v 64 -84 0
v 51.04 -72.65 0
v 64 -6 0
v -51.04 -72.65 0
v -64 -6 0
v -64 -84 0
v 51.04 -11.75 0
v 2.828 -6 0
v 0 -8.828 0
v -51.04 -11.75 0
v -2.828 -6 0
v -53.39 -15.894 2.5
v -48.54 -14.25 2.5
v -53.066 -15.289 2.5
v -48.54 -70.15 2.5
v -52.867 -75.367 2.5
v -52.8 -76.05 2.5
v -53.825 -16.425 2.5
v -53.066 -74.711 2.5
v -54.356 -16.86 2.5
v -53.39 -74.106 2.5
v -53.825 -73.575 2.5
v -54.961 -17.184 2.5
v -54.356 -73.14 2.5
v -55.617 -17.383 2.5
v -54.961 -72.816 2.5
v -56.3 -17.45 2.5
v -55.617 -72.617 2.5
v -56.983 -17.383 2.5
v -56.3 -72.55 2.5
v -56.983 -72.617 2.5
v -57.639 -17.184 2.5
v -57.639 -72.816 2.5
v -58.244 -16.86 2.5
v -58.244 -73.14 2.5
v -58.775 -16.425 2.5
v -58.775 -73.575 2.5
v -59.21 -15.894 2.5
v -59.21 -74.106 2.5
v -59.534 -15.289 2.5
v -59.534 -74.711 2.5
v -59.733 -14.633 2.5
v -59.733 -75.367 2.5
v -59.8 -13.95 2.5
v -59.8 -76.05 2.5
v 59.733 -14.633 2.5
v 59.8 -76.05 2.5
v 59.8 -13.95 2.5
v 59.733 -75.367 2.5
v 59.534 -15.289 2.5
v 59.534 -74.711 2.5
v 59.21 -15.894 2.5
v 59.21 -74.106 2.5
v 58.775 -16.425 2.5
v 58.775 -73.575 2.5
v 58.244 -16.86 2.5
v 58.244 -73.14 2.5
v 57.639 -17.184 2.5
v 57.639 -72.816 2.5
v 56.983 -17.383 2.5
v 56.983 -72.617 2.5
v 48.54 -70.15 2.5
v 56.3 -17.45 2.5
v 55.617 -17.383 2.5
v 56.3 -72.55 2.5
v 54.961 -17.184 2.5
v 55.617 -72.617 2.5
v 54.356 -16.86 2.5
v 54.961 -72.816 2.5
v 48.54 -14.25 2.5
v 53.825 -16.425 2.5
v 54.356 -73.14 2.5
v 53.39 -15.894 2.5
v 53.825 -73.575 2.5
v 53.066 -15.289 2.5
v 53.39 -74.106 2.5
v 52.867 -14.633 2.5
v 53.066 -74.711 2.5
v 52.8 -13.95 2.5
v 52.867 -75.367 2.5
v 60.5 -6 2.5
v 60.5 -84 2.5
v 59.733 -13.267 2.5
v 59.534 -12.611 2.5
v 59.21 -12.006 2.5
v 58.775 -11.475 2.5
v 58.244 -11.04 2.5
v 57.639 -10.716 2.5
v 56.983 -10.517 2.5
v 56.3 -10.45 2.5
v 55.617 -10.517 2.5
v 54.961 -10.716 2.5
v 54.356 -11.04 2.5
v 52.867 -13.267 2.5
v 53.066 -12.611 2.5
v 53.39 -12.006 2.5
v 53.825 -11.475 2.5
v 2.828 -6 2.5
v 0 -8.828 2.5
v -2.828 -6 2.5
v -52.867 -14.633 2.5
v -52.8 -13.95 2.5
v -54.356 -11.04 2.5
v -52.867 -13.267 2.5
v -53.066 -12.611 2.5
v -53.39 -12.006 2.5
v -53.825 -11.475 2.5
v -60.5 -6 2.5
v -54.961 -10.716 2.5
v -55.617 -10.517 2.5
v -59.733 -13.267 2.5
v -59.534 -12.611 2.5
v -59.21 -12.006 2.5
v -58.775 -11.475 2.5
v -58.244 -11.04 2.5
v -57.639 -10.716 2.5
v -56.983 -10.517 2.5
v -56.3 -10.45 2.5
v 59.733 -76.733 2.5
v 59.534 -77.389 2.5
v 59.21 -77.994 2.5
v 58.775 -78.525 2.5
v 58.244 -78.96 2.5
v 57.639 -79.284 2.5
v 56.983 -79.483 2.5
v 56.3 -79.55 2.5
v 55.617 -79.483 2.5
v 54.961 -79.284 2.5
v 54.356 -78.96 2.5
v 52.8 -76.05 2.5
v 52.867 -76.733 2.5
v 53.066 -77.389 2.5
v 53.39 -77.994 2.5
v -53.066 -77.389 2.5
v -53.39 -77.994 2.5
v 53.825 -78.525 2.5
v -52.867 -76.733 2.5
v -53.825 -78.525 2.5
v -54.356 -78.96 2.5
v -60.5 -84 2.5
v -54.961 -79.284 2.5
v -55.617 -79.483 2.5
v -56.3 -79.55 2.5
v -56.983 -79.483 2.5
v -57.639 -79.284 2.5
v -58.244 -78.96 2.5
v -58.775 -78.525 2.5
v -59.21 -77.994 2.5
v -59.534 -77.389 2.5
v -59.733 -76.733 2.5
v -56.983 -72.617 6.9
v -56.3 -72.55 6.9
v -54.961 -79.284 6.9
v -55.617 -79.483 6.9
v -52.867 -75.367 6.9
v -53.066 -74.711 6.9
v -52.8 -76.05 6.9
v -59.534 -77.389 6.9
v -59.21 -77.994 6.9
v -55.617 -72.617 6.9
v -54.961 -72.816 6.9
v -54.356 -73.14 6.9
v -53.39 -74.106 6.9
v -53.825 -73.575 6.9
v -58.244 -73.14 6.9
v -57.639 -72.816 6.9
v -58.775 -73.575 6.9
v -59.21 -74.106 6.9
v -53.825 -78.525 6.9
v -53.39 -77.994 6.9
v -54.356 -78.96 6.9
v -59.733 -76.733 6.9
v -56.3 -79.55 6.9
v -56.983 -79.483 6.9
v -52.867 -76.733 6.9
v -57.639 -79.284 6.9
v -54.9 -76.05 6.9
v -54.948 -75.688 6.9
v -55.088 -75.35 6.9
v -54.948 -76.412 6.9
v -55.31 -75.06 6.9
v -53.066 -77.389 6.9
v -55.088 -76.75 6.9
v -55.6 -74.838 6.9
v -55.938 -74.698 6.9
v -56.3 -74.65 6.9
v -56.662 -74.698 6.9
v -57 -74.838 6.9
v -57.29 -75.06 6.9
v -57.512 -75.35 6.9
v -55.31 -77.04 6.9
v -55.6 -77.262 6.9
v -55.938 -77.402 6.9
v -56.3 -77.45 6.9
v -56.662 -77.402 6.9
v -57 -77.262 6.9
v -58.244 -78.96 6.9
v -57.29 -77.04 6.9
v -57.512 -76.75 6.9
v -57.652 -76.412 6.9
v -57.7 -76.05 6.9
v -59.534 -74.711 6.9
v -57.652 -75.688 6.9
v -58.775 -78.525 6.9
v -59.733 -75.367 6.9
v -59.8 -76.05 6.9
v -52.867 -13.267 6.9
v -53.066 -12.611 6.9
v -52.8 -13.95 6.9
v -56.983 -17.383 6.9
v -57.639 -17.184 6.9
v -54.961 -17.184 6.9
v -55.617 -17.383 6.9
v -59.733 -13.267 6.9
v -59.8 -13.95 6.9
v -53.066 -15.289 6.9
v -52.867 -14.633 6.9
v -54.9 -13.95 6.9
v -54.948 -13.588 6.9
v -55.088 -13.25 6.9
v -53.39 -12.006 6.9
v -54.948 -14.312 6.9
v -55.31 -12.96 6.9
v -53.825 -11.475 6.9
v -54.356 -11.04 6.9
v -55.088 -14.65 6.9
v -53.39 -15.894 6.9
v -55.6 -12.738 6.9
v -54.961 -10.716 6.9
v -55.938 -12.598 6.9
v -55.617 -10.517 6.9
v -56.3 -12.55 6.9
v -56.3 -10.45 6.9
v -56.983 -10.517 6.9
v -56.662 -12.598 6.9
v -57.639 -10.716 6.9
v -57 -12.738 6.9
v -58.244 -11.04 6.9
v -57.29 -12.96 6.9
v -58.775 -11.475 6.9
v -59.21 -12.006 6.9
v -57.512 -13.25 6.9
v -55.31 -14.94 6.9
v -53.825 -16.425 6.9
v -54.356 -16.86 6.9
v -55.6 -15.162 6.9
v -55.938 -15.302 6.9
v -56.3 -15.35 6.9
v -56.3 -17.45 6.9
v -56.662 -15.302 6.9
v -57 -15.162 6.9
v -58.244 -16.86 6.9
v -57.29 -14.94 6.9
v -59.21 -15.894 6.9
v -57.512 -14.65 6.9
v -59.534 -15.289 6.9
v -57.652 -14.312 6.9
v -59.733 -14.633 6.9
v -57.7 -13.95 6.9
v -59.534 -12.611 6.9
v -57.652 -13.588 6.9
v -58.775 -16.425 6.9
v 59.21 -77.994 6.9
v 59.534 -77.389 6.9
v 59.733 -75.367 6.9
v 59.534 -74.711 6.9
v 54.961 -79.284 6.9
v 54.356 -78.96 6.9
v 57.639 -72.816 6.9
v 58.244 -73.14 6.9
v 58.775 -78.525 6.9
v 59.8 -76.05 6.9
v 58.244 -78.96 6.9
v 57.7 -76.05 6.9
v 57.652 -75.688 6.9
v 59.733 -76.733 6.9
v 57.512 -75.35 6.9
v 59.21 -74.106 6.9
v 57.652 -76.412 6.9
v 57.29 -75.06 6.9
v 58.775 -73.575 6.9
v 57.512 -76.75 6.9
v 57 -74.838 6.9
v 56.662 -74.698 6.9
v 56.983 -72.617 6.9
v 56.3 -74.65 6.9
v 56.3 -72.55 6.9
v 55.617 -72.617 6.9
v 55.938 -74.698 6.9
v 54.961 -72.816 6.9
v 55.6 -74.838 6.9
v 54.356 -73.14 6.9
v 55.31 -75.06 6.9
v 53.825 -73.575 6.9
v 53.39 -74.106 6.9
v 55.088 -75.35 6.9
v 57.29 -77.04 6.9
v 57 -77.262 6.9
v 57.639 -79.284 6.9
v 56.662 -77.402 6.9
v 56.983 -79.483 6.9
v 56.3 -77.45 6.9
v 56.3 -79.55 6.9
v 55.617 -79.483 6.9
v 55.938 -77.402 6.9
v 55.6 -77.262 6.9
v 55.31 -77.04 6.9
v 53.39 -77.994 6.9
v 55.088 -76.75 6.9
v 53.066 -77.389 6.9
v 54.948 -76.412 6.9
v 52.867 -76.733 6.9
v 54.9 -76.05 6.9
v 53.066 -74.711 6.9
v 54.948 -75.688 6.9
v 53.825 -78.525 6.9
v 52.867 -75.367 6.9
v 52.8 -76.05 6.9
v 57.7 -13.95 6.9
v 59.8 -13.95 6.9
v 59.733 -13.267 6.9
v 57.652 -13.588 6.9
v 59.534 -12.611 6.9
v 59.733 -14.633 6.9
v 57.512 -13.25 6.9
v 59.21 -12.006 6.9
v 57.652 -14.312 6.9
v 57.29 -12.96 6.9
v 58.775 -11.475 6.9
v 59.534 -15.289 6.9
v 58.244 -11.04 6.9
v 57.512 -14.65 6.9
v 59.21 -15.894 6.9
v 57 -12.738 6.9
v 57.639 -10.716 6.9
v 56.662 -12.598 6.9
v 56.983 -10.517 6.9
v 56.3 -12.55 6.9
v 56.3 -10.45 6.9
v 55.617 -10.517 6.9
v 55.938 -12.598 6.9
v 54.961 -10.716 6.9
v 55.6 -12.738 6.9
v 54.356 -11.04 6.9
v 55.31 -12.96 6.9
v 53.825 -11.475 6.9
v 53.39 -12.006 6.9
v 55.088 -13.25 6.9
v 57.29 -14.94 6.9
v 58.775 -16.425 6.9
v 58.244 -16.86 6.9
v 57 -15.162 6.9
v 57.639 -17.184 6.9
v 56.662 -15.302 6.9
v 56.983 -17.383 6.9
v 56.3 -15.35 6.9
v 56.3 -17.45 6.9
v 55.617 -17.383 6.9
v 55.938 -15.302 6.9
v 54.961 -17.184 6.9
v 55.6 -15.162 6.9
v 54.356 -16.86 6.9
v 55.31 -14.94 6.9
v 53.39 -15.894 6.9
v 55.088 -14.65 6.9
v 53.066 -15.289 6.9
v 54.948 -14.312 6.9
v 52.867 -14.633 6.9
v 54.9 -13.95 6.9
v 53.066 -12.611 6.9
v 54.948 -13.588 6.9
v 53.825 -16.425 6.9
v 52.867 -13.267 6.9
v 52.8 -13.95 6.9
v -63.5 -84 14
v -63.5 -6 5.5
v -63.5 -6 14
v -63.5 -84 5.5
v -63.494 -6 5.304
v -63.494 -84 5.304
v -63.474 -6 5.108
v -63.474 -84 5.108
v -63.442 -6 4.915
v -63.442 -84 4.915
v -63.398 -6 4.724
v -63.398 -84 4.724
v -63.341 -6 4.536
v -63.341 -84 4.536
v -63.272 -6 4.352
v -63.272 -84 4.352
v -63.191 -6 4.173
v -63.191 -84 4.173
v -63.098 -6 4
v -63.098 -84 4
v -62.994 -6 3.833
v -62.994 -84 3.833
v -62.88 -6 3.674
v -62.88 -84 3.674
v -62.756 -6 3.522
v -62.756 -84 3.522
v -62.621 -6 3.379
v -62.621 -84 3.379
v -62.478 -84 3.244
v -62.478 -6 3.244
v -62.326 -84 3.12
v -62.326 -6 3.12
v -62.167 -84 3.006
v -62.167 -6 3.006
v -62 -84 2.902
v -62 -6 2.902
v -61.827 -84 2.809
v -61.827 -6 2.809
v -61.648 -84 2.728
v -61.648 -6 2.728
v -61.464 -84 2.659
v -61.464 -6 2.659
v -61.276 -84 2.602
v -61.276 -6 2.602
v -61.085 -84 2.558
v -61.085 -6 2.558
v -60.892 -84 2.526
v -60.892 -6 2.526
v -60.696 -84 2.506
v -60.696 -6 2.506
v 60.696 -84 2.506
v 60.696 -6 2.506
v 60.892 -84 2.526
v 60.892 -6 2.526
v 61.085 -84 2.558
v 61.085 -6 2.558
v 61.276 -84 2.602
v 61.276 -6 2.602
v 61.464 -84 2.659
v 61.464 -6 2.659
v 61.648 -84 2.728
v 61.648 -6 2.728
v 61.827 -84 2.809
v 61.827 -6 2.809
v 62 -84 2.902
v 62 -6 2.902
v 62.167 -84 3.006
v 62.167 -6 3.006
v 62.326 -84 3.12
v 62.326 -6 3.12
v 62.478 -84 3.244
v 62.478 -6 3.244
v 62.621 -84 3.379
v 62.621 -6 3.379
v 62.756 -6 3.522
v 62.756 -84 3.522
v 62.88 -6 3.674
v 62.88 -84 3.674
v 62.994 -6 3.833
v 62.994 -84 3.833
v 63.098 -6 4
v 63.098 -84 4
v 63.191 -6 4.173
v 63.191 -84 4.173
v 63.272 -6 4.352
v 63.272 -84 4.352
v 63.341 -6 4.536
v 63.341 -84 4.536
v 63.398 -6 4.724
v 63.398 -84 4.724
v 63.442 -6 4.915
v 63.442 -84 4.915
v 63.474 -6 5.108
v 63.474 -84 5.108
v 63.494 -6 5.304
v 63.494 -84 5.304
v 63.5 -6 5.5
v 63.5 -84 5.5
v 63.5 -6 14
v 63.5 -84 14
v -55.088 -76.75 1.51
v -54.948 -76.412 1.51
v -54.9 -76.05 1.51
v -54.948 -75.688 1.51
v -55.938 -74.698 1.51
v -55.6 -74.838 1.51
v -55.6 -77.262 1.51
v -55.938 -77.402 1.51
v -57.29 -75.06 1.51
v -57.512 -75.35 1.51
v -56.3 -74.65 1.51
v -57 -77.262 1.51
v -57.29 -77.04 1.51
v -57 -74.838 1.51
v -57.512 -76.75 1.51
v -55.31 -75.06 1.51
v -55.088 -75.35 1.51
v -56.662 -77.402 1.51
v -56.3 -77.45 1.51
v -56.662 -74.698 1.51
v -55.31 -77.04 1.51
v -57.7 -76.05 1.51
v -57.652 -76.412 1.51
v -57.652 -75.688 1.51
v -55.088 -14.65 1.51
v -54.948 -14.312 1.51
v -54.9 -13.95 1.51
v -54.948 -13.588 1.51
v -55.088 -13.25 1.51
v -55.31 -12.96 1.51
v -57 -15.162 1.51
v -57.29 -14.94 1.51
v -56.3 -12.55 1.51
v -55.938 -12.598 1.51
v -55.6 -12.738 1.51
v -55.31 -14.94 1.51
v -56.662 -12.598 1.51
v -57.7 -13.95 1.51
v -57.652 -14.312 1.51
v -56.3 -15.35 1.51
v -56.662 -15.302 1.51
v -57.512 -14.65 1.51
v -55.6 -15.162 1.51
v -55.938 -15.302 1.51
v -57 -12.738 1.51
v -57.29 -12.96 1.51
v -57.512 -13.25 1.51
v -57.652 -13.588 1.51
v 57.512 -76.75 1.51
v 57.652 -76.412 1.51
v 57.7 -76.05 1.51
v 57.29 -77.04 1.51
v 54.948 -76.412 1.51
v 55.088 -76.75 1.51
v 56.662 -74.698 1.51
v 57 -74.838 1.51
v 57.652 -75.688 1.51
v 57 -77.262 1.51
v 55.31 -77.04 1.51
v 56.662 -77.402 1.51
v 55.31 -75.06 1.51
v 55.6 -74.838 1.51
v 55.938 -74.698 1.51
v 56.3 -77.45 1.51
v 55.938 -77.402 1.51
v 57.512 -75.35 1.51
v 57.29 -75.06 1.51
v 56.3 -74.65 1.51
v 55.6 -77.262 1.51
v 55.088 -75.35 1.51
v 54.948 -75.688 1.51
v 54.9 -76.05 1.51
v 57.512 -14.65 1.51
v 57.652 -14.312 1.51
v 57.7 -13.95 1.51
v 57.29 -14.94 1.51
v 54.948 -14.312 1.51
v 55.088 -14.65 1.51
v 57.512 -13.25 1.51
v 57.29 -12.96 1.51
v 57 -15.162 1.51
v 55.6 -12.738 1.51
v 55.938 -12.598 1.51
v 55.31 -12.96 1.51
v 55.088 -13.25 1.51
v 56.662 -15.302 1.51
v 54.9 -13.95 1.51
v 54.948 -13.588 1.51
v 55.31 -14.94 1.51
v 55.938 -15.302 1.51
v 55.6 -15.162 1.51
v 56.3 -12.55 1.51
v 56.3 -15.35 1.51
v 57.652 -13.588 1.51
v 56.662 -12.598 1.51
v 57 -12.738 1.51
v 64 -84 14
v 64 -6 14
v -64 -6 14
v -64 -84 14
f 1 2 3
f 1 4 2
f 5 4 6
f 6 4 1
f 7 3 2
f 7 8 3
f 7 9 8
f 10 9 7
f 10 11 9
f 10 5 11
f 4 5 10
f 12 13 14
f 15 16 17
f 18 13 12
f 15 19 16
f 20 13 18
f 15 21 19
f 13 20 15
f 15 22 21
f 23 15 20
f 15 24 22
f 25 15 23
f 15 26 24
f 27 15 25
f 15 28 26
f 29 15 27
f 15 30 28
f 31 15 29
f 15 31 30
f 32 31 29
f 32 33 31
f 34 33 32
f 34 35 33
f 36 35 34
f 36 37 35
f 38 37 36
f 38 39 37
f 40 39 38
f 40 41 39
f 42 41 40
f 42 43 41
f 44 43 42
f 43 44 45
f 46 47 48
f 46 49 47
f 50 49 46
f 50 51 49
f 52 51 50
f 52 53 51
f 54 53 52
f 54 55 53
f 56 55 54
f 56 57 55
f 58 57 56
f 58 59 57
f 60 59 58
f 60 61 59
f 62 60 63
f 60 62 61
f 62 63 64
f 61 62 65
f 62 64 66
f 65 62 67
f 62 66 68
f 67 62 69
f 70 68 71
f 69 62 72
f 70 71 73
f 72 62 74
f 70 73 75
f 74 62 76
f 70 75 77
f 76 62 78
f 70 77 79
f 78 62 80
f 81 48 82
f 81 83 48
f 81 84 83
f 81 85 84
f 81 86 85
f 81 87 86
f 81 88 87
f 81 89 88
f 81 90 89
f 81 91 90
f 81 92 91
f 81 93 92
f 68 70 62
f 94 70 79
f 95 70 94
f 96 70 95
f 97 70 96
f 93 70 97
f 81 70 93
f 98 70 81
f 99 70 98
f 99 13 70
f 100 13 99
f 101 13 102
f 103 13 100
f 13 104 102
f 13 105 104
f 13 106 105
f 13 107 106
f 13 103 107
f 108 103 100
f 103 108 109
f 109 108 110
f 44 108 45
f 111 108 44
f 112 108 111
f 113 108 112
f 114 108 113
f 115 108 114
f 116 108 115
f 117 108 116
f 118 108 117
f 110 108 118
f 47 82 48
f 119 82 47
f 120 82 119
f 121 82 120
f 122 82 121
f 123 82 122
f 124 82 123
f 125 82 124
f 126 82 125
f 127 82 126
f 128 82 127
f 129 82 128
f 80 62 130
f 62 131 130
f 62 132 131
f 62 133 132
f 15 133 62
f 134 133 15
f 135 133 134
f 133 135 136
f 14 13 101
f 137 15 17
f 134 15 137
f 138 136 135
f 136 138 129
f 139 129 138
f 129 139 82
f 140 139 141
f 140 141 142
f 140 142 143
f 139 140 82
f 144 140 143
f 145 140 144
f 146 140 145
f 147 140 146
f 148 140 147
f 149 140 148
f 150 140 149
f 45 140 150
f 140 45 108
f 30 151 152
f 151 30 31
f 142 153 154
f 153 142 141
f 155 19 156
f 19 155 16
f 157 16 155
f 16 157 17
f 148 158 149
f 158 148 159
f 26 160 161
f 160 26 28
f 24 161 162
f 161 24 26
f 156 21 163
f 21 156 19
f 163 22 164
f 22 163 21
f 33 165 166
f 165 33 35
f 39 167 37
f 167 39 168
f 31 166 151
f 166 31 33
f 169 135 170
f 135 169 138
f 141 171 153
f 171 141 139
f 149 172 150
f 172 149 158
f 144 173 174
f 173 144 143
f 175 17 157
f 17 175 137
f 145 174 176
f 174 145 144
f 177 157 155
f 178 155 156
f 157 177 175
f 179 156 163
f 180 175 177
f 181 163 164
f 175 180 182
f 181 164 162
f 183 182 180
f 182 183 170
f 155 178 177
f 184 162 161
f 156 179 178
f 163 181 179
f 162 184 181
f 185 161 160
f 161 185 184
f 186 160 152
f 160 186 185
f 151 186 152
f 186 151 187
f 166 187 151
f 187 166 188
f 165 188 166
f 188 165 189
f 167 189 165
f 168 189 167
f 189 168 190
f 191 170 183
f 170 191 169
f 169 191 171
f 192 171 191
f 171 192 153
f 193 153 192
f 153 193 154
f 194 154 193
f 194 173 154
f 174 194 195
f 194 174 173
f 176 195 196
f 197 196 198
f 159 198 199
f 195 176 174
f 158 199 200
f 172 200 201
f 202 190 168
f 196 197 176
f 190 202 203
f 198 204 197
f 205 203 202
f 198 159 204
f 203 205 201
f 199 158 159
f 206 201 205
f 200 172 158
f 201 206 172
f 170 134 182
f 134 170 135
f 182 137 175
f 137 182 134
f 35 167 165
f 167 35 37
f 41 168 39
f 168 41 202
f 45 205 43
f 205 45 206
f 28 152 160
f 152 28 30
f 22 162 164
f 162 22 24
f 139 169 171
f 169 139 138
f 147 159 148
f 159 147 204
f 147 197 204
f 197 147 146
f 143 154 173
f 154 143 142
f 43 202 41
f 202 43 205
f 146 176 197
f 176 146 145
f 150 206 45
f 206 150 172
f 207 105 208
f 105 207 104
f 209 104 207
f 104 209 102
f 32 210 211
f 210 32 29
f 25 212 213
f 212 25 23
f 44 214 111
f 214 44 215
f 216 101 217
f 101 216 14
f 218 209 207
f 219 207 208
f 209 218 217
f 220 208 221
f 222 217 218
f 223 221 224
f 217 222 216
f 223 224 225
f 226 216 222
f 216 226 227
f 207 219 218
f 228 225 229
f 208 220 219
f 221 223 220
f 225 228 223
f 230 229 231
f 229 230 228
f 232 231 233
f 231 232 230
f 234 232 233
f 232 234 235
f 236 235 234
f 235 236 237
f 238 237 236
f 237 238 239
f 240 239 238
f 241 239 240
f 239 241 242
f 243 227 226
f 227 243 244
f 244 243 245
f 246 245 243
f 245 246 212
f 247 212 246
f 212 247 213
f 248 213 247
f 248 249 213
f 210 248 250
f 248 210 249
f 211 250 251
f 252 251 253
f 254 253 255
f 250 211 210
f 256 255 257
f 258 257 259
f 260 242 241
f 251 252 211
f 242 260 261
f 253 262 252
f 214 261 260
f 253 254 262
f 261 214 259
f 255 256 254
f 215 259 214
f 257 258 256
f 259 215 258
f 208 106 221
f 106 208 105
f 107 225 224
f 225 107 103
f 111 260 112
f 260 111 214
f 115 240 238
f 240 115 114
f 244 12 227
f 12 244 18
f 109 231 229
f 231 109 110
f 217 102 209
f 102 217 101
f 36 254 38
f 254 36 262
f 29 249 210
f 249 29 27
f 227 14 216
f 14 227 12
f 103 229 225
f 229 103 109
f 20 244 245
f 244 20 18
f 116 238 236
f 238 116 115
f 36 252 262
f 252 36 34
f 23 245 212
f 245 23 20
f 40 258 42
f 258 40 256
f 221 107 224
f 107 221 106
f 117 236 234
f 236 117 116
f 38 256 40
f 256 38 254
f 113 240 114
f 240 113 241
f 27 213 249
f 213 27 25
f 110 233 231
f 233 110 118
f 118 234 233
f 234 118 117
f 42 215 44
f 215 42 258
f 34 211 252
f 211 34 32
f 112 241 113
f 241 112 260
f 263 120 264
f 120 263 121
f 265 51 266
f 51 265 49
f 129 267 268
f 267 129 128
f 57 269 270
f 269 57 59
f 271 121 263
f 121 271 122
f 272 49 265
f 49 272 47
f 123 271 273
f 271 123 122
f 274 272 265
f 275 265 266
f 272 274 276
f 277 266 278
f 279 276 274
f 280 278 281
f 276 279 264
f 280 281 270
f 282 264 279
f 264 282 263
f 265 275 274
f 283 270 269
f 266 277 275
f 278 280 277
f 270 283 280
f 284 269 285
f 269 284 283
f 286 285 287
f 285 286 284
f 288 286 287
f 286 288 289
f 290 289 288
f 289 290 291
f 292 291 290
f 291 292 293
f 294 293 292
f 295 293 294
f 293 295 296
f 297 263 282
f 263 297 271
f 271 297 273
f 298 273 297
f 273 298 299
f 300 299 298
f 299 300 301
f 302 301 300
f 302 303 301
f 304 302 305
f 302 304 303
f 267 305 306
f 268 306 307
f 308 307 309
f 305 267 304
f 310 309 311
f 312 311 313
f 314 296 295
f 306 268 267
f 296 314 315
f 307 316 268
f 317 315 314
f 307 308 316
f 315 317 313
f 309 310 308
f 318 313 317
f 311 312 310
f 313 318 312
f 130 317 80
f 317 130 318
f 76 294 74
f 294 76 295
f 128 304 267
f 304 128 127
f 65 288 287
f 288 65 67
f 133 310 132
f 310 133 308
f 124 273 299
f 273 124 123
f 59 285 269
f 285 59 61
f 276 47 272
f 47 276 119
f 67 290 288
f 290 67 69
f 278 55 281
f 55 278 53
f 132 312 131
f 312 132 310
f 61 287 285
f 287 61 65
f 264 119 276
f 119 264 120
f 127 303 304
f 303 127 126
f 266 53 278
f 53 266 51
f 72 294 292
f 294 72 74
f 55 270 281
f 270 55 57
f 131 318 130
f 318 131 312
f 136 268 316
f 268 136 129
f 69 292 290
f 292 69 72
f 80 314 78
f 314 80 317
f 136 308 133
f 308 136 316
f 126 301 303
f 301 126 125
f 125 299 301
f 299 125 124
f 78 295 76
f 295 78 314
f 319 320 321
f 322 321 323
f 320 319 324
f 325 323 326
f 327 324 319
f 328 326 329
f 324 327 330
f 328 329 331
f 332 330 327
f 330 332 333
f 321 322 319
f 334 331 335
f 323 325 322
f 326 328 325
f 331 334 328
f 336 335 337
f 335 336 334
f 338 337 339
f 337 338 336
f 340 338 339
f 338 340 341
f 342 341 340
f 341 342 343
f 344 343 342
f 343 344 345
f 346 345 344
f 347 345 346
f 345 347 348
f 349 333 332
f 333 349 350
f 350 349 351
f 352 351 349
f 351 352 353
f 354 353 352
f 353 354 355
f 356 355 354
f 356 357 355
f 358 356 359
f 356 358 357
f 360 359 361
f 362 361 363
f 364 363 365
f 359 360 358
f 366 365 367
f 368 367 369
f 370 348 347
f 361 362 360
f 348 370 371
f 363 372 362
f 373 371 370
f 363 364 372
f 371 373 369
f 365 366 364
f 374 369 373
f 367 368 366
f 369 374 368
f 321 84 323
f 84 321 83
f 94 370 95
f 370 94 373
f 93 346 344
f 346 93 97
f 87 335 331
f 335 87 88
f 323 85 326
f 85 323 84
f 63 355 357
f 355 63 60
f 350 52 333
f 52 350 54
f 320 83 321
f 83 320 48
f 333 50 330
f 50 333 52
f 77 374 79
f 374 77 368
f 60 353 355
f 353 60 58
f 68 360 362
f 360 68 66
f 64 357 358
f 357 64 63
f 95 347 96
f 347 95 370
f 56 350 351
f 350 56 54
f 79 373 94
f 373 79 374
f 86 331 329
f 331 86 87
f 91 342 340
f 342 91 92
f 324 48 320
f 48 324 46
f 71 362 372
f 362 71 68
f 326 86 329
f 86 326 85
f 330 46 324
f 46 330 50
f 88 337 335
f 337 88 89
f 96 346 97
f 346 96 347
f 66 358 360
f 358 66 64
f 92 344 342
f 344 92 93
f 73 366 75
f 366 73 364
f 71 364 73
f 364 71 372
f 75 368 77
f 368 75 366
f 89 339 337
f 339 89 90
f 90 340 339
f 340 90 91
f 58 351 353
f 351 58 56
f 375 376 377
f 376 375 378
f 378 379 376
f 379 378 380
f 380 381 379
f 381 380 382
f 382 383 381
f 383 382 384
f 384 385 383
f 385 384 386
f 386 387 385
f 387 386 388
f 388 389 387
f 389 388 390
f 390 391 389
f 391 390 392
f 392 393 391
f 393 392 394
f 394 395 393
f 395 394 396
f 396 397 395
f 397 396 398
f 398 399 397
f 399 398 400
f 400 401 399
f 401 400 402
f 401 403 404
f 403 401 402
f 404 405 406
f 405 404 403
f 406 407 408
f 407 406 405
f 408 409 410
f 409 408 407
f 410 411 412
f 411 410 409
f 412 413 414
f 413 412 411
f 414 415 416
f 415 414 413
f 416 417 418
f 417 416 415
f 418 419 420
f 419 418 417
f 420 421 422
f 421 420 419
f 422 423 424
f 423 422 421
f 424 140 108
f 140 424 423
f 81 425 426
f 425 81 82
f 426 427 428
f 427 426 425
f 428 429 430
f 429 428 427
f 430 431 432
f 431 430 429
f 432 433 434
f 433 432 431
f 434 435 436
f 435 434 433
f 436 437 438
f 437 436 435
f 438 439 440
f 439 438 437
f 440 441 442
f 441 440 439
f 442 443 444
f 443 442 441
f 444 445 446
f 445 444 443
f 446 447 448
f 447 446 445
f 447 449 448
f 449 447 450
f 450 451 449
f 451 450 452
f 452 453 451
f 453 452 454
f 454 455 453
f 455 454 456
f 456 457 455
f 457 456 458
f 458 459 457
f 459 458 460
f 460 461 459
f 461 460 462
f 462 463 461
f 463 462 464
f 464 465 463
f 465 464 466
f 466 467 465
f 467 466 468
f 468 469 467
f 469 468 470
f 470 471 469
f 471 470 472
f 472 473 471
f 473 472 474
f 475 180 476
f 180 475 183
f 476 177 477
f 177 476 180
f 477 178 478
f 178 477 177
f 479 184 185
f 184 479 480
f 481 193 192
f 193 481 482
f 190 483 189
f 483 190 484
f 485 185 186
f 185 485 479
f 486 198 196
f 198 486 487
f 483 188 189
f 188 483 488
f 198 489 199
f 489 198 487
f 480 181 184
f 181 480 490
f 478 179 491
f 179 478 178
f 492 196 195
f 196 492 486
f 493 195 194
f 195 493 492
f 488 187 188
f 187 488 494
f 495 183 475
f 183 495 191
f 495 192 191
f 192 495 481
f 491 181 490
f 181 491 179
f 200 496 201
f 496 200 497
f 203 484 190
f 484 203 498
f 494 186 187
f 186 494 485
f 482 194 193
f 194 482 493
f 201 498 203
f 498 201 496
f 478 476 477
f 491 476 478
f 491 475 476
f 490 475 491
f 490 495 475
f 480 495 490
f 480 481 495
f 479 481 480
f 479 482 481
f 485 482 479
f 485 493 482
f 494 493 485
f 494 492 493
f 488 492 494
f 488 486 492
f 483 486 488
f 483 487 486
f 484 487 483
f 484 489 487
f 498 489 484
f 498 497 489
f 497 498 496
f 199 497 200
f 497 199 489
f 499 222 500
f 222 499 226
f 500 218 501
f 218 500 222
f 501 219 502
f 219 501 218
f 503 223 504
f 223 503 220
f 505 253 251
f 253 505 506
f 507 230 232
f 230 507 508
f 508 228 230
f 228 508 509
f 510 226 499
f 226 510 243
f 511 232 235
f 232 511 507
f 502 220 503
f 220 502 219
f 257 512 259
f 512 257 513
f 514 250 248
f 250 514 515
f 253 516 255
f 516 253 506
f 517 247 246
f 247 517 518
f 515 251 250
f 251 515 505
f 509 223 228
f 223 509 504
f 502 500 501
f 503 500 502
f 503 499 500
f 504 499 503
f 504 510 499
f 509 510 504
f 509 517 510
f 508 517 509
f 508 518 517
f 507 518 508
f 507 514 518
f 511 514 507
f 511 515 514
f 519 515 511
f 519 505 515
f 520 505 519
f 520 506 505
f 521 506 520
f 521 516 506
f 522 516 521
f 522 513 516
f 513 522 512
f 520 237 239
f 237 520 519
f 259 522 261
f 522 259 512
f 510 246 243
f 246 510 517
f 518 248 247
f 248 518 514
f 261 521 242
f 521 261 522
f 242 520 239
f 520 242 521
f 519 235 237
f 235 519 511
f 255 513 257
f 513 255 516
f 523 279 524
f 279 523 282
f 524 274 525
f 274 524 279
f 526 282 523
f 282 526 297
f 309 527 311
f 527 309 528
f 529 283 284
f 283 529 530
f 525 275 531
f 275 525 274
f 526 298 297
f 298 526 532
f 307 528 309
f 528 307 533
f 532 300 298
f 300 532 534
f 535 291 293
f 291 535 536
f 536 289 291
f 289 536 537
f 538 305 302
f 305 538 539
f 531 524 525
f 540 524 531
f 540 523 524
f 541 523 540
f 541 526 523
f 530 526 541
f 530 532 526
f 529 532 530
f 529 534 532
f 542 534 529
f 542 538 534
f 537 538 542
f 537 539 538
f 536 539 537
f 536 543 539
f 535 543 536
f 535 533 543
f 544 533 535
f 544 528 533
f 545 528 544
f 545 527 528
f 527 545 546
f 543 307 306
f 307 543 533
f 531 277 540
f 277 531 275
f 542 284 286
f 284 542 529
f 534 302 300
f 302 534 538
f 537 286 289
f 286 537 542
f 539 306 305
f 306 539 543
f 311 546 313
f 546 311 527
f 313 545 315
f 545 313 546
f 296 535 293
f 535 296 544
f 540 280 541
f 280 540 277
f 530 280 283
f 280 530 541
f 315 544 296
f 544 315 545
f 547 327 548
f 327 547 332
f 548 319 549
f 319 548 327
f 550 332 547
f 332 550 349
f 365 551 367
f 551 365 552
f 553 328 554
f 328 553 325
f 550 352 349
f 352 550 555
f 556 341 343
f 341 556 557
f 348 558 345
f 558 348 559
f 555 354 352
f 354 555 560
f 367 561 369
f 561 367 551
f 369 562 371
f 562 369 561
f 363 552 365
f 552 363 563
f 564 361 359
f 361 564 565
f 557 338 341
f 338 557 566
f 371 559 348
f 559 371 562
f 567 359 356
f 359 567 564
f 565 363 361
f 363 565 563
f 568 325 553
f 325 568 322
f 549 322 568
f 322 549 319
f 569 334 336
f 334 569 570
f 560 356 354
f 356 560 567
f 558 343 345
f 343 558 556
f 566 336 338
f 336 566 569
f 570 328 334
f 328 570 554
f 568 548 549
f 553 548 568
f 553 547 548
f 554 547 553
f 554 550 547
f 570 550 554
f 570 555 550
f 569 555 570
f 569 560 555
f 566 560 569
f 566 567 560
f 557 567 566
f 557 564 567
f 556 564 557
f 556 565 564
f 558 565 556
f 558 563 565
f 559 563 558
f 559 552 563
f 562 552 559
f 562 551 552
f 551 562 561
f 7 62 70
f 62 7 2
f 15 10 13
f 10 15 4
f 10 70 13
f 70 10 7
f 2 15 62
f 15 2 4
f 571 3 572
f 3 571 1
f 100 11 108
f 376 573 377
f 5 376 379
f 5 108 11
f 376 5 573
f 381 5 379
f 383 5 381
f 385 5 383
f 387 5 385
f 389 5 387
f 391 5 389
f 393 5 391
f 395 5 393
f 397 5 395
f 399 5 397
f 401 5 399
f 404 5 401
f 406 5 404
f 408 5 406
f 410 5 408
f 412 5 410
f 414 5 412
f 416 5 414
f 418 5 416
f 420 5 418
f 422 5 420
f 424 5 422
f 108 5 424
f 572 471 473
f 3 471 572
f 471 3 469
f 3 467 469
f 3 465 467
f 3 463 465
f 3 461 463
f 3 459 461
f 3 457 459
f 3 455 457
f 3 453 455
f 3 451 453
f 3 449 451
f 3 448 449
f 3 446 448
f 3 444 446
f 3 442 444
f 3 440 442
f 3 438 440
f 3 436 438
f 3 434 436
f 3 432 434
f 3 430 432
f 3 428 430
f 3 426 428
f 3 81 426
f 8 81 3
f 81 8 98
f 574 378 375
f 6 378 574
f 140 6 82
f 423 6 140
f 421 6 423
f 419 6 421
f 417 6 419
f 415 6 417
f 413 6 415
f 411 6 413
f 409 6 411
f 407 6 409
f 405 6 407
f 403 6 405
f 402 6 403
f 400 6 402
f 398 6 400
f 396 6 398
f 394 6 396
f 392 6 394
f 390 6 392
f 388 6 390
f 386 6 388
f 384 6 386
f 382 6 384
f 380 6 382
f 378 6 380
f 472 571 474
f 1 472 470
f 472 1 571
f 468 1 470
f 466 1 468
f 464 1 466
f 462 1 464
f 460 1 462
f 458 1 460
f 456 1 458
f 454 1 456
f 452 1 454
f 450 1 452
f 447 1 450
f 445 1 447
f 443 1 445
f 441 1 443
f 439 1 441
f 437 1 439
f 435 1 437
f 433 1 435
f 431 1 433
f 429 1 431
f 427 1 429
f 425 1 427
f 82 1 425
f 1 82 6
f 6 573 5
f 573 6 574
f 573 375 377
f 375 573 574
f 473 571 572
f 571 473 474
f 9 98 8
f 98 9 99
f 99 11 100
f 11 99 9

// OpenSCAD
// file: ../level2.scad
// Level 2 - shared dimensions for the drive deck, motor bracket, body and skirt.
// Frame: origin at the centre of the deck's TOP surface; +Z up, +Y = front (display), +X = right.
// The lazy Susan sits on the deck's plinth; the turntable pulley hangs through the deck's hole.
include <params.scad>

// ---- outline -------------------------------------------------------------------------------
l2_size   = [160, 160];     // footprint (rounded square), same for body and skirt
l2_r      = 14;             // corner radius
l2_h      = 90;             // body height (floor to the deck's underside... see body)
l2_wall   = 2.5;            // body walls

// ---- the reComputer under Level 2, and the skirt round it (skirt.scad) -------------------------
jetson    = [130.1, 121.1, 51];     // reComputer J4012, MEASURED (x, y, height) with its case top OFF;
                                    //   ports at the back, fan near the middle (~1 cm toward the front)
jetson_top = 7.1;                   // the case top, if fitted: 58.1 with it, MEASURED
air_gap   = 10;                     // over the case top when it's on (17 over the open board): the fan
                                    //   draws in from here
skirt_h   = jetson[2] + jetson_top + air_gap;   // 68.1: desk -> Level 2's floor
// body <-> skirt screws (M3 down through the body floor into inserts in the skirt): along the
// sides, outside the reComputer (x +/-65)
skirt_pts = [[-71, -45], [-71, 45], [71, -45], [71, 5]];   // clear of the buck (left),
                                    //   the perfboard (right front) and the motor (right back)

// ---- deck ----------------------------------------------------------------------------------
deck_t    = 4;              // deck plate: z = -deck_t .. 0
deck_hole = 112;            // reach the inner ring's bolts from below during assembly

// ---- lazy Susan + turntable pulley (turntable_pulley.scad) --------------------------------
z_ls      = plinth_h;                    // lazy Susan's underside (on the plinth): 2
z_plate   = z_ls + ls_h;                 // turntable plate's underside = inner ring top: 12.5
belt_drop = 24.5;                        // plate underside -> belt centre (turntable_pulley)
z_belt    = z_plate - belt_drop;         // -12: belt centre, below the deck top
pulley_R  = 100 * 2 / PI / 2;            // 31.83: ring pulley pitch radius (100 T)
pulley_bottom = z_belt - 3.2 - 1.6 - 2.2;  // -19: lowest point of the hanging pulley
clamp_r   = 35.5;                        // pulley's belt clamp block (its widest part)

// ---- motor ----------------------------------------------------------------------------------
motor_a   = -45;            // direction of the motor from the centre: back-right corner
motor_C   = 46;             // nominal centre distance; the bracket slides +/- tension_travel (42..50:
                            //   at 41 the motor pulley would touch the ring pulley's flange)
tension_travel = 4;
nema      = [42.3, 33.4];   // NEMA17 (MEASURED body length; not a pancake): square, body length
nema_shaft = 17.5;          // MEASURED shaft length above the face
nema_holes = 31;            // M3 screw spacing on its face
nema_boss = 22;             // centring boss on its face (dia), ~2 tall
mp_T      = 20;             // motor pulley teeth
mp_belt_c = 13 + 7.1 / 2;   // MEASURED: pulley pushed fully down on the motor, its toothed section
                            //   (7.1 wide; the belt is a standard 6 mm) runs 13..20.1 above the face
bracket_t = 3;              // motor plate thickness; the pulley passes down through its centre hole
bracket_drop = 3;           // the motor hangs this much LOWER than "pulley pushed fully down" needs:
                            //   on the first build the ring pulley sat ~2 mm below the motor pulley,
                            //   so the motor pulley now starts ~1 mm low and is raised on the shaft
                            //   to line the belt up (a few mm of adjustment either way)
z_motor_face  = z_belt - mp_belt_c - bracket_drop;   // -31.55
z_bracket_top = z_motor_face + bracket_t;    // -28.55
z_motor_bottom = z_motor_face - nema[1];     // -64.95
z_mp_top  = z_motor_face + bracket_drop + 13 + 7.1 + 1;   // ~-7.45 (pulley raised to the belt; EST top flange ~1 mm)
// main file
// Display fit test: just the front wall of the Level 2 body round the 4.3" display - the window
// (raised 2.8 mm above the board's centre, chamfered) and the four posts with M3 inserts - cut
// straight from l2_body.scad, so it is exactly what the body will have. (~30 min)
// The notch marks the TOP edge. Check: screw the JC4827W543 on (image upright) (M3 x 6-8 into heat-set inserts); the image should fill the
// window evenly with only black border showing, and the glass should sit flat on the wall.
// PRINT as modelled: face down on the bed, posts up, no supports.
use <l2_body.scad>
include <../level2.scad>

disp_zc = -l2_h / 2;                           // must match l2_body.scad
half    = l2_size[0] / 2;

translate([0, 0, half]) rotate([-90, 0, 0])    // wall's outside face -> the bed, posts up
    difference() {
        intersection() {
            l2_body();
            translate([-64, half - 14, disp_zc - 39]) cube([128, 14.2, 78]);
        }
        // notch in the middle of the TOP edge (the window is offset toward it)
        translate([0, half - 7, disp_zc + 39]) rotate([0, 45, 0]) cube([4, 20, 4], center = true);
    }
